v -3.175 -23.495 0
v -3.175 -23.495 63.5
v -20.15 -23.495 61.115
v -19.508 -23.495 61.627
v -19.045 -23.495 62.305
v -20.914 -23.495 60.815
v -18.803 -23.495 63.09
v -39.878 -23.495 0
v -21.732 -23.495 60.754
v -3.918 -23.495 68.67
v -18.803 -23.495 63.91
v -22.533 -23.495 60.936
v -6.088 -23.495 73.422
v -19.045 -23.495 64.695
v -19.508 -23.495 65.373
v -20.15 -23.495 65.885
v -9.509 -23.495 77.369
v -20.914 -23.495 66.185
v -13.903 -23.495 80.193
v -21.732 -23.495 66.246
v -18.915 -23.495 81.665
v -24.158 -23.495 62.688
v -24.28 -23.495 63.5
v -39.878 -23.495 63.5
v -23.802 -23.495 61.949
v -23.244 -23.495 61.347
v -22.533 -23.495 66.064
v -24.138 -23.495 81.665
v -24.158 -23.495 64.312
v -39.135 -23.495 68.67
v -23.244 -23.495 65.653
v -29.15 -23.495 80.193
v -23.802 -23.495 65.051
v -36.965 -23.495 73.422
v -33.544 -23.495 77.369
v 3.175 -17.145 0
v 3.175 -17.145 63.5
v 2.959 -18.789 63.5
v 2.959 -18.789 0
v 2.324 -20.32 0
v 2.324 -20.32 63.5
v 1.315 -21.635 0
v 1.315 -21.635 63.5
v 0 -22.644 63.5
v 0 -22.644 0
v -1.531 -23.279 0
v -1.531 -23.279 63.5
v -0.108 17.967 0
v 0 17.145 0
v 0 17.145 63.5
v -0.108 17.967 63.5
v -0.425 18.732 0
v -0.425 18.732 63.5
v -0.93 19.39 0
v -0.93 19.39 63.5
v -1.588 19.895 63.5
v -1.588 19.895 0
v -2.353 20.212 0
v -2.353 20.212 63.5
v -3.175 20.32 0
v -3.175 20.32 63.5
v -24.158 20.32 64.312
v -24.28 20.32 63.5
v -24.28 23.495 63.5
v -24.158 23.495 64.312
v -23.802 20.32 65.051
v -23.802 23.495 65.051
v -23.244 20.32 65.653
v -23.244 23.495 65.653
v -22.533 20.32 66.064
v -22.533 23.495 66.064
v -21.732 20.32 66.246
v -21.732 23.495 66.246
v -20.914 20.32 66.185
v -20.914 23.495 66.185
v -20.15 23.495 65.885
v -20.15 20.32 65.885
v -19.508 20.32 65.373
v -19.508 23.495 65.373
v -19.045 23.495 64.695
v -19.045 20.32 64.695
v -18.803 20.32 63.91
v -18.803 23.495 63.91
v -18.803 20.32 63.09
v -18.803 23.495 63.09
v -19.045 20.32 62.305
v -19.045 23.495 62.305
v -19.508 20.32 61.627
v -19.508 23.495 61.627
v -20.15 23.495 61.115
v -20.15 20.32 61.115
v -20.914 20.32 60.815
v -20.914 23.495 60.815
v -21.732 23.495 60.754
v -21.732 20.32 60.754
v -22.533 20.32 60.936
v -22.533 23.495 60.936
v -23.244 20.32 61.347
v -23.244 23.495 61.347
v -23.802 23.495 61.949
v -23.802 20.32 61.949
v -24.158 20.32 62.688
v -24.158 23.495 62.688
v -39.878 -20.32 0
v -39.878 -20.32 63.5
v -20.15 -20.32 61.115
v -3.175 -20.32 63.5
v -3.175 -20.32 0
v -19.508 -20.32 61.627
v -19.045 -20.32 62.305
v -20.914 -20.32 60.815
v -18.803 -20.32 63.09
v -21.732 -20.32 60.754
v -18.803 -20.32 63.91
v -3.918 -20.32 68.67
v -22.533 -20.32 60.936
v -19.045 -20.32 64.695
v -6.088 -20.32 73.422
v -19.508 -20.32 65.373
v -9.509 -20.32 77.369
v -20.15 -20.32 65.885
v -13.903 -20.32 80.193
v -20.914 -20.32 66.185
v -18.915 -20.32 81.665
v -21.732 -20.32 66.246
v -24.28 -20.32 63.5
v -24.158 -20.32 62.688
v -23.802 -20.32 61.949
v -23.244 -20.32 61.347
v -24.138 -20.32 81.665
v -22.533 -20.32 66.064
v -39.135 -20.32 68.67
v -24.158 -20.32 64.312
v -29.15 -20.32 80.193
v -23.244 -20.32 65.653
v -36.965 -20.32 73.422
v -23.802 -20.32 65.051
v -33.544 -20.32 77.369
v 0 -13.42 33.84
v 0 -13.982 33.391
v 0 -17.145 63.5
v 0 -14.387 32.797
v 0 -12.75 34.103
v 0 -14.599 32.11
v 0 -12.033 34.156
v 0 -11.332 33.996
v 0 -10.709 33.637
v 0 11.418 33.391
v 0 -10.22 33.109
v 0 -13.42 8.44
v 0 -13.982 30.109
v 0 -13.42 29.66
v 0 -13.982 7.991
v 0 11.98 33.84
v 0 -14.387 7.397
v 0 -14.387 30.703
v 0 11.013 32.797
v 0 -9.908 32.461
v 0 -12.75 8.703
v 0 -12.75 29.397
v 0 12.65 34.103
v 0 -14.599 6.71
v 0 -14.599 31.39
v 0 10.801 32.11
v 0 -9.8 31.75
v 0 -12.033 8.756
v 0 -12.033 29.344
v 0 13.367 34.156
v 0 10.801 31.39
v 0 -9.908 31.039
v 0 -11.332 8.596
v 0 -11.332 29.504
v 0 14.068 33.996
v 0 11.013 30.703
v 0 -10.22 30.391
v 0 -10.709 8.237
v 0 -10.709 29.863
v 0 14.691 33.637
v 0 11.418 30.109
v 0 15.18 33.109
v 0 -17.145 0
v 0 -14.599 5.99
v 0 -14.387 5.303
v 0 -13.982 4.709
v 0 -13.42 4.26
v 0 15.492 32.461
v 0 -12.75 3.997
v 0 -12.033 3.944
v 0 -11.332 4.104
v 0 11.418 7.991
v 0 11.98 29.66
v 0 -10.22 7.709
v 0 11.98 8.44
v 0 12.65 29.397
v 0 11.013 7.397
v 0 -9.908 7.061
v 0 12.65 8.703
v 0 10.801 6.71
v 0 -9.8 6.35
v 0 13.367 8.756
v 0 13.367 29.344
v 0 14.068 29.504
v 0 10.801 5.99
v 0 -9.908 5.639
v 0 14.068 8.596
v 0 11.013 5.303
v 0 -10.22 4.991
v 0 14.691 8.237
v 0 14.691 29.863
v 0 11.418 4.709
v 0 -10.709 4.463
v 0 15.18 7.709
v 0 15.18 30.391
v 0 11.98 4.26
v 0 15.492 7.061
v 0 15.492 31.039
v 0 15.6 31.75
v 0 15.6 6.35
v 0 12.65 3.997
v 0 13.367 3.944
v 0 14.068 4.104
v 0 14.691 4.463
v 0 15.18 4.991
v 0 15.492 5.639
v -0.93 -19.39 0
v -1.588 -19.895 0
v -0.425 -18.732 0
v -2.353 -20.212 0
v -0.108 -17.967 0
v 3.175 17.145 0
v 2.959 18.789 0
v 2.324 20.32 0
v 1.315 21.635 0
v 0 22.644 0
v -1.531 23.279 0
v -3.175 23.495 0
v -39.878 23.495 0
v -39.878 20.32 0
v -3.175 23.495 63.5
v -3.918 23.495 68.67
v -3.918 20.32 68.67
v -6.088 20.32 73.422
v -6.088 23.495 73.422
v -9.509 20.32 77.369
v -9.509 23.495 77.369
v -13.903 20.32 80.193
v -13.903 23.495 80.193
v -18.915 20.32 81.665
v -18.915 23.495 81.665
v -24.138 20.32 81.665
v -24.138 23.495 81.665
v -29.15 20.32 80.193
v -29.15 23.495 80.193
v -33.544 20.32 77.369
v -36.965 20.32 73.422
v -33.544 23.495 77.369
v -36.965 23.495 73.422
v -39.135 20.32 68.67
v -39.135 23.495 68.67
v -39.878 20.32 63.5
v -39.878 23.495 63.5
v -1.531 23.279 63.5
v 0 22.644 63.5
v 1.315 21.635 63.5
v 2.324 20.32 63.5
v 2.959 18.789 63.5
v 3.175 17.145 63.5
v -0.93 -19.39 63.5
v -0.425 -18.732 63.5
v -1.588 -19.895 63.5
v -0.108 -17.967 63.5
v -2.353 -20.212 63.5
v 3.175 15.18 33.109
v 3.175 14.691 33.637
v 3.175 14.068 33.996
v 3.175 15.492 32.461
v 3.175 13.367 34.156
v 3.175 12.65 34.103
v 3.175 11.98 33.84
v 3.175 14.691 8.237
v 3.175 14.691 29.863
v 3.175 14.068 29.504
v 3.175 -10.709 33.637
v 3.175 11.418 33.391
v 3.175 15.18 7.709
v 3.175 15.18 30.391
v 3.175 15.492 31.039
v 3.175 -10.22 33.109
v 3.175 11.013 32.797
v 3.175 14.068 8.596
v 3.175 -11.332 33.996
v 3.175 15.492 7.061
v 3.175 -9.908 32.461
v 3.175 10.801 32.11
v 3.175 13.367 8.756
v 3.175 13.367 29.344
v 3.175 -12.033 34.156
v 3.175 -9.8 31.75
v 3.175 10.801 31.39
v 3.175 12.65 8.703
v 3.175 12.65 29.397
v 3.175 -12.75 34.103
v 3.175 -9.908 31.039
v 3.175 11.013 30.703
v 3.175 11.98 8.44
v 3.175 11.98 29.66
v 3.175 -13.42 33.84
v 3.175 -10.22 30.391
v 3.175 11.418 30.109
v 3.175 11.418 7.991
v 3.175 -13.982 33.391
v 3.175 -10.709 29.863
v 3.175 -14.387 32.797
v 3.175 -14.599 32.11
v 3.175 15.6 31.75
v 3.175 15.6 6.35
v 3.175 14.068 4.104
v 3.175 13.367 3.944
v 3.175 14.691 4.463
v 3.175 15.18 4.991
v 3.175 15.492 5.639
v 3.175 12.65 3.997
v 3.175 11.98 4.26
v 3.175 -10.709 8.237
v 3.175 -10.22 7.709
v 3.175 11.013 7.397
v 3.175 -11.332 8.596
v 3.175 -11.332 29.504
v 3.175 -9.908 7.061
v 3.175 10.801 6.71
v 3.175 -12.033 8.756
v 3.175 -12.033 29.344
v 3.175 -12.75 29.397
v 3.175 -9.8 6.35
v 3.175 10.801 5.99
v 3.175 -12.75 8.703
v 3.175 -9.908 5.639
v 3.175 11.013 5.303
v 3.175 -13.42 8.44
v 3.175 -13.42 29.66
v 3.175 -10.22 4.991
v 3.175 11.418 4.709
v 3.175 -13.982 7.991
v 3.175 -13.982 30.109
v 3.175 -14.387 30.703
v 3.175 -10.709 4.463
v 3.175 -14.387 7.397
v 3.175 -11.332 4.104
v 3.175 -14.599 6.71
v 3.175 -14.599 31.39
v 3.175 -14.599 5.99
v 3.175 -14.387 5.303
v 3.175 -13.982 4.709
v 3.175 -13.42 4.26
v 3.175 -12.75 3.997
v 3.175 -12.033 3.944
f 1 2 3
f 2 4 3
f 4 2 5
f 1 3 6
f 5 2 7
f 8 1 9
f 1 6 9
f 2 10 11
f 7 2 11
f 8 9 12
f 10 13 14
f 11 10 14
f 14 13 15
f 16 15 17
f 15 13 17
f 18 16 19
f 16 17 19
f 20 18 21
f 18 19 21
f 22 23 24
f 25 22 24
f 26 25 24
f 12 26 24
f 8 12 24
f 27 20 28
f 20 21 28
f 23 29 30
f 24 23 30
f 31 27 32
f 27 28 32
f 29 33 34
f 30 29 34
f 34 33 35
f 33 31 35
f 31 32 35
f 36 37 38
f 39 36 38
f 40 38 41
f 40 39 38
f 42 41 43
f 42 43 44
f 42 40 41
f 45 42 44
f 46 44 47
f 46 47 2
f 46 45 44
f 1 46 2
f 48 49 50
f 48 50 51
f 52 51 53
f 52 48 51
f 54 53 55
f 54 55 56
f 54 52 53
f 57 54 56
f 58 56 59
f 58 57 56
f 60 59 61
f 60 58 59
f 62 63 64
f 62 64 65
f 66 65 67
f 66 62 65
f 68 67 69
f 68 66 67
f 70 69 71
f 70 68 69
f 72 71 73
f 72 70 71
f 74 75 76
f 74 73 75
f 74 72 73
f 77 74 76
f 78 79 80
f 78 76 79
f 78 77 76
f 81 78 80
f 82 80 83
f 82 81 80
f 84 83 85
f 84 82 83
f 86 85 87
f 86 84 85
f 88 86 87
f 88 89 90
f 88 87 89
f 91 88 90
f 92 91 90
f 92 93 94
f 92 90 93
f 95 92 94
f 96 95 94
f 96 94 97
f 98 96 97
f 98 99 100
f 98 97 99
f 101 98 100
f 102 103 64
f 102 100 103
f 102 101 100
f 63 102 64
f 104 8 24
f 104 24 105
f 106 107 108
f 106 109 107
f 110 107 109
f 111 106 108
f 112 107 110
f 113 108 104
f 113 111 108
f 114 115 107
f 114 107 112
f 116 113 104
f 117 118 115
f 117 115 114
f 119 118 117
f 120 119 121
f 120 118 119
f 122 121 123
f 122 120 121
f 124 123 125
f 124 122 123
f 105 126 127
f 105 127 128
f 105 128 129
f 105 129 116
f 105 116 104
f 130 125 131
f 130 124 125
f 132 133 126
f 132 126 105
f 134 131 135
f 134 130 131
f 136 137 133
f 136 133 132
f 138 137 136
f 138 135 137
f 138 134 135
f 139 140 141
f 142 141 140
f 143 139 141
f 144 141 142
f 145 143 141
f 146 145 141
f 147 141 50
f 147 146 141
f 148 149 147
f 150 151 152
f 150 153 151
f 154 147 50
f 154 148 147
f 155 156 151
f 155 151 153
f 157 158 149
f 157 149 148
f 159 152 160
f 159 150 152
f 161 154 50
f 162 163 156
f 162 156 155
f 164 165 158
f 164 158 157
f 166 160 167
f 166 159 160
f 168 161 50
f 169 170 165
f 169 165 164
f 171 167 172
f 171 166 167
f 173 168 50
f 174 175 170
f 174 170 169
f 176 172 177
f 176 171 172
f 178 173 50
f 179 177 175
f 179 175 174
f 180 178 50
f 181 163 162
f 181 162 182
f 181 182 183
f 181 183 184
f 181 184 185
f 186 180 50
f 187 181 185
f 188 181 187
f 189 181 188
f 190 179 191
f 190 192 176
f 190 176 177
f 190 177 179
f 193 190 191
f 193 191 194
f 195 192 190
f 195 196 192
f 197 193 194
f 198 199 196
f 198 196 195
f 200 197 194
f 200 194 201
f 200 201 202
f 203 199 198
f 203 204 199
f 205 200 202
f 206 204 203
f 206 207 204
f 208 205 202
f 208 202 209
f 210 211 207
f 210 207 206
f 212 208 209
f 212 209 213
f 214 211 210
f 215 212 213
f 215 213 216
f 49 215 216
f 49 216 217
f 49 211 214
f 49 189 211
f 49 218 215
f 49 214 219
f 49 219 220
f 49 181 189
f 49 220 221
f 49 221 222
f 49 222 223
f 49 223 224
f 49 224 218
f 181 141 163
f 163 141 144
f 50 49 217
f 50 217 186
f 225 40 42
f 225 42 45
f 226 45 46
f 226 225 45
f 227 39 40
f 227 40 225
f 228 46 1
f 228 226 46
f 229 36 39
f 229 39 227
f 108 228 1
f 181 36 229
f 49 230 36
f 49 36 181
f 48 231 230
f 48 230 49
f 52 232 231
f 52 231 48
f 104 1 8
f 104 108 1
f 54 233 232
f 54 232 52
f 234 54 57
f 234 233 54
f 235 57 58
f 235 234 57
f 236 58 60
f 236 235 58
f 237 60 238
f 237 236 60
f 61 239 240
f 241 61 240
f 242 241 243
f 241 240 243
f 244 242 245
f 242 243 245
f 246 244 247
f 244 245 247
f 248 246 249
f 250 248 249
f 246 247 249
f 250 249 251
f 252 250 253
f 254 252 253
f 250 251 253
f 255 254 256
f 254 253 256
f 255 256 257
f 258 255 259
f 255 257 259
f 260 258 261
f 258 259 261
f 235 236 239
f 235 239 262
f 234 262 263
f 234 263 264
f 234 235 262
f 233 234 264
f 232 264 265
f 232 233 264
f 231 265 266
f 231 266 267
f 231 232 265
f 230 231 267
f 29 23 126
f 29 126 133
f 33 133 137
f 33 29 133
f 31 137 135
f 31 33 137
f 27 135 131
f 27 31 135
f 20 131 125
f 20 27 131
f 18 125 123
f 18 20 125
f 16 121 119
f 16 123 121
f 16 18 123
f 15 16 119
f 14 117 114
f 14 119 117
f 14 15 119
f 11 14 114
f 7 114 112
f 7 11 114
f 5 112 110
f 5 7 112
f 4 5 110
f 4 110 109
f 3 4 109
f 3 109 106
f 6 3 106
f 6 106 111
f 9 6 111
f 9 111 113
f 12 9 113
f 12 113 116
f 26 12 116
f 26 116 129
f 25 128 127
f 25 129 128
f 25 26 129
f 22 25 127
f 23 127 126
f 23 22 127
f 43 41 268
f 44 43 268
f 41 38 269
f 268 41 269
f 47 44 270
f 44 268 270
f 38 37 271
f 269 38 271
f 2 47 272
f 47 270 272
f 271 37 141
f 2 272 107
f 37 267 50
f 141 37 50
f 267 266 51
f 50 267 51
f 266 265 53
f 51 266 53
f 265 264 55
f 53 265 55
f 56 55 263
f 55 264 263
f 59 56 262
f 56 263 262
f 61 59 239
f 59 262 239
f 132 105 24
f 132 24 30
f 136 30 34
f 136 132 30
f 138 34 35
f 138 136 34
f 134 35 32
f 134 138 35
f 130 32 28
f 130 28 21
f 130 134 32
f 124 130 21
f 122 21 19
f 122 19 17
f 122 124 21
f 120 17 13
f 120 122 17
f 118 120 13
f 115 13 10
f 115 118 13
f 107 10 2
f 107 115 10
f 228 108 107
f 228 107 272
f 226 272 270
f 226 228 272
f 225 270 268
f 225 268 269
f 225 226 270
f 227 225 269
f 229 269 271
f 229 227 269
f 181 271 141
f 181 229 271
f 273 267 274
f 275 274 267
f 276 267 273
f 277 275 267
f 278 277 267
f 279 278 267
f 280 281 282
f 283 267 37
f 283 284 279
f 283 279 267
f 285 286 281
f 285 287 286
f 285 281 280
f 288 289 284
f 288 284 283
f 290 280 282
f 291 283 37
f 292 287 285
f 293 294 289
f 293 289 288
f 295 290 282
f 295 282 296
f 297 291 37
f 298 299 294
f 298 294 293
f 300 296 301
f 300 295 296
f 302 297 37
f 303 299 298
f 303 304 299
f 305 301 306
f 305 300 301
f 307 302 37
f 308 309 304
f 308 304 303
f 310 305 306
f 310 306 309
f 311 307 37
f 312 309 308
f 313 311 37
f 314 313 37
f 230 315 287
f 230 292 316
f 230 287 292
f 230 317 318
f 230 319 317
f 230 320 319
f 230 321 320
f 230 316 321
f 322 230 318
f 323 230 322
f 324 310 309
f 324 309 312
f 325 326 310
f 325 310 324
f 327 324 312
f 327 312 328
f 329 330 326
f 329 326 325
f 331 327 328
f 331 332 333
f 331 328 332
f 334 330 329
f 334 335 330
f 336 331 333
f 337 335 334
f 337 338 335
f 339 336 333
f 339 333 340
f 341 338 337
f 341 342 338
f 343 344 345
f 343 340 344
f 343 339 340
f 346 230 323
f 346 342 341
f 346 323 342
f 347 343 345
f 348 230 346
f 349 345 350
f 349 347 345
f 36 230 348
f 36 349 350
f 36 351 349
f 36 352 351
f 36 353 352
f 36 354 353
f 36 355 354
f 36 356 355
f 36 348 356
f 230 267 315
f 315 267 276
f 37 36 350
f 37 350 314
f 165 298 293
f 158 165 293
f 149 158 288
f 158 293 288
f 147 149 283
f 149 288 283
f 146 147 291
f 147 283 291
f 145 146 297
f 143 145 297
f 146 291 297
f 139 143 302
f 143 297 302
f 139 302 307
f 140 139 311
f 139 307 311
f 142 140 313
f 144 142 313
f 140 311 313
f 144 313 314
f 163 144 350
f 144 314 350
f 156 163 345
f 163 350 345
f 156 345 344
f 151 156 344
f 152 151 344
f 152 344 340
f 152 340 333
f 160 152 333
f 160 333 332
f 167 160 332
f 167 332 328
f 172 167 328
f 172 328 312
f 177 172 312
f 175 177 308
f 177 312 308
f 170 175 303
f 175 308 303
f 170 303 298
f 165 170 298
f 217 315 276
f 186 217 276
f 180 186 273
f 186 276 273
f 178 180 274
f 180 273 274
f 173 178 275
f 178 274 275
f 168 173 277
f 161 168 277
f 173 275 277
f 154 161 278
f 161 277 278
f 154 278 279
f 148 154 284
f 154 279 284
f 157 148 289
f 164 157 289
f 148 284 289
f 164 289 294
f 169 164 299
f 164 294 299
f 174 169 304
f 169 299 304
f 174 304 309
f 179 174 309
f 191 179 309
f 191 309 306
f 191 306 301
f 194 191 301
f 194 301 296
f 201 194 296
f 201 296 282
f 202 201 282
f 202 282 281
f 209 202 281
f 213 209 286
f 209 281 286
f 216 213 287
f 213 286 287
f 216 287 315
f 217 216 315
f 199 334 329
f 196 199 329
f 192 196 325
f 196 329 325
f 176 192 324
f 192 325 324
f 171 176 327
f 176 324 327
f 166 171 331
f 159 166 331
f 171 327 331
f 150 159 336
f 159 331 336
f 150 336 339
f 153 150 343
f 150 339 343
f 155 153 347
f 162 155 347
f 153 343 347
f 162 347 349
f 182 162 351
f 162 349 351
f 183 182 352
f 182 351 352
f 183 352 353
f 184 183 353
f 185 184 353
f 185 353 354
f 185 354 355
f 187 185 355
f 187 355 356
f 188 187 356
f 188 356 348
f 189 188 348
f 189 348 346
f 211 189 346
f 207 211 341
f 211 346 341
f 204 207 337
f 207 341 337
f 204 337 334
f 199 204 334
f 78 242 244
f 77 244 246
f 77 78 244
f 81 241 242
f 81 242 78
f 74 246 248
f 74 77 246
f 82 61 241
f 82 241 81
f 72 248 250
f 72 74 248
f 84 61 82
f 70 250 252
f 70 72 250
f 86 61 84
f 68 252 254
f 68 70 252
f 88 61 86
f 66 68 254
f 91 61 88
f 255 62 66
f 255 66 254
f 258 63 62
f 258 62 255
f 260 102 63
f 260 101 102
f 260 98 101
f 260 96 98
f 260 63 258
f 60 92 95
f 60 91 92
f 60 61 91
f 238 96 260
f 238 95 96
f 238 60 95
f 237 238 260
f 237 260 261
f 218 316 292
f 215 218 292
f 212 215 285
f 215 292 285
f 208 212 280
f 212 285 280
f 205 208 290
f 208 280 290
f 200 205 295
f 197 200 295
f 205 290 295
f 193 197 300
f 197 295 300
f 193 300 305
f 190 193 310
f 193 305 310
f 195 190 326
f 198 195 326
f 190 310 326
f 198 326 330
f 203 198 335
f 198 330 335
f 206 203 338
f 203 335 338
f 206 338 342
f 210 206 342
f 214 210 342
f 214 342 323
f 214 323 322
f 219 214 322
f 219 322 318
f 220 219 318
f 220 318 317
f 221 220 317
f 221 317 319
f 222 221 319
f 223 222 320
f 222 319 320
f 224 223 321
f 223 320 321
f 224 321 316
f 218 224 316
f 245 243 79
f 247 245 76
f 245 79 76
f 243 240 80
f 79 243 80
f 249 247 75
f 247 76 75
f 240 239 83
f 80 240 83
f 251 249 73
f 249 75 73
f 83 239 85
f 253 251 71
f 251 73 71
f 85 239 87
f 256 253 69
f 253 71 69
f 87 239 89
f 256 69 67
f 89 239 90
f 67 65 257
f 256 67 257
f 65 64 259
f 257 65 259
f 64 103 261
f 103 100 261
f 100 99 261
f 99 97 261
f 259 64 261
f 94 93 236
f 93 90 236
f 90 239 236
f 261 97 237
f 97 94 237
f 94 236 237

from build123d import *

# Parameters (mm, degrees)
BASE_FLANGE1_DEPTH      = 63.5
BOSS_EXTRUDE1_DEPTH     = 3.175
BOSS_EXTRUDE2_START     = -3.175
BOSS_EXTRUDE2_DEPTH     = 3.175
SKETCH8_R               = 2.413
CUT_EXTRUDE1_DEPTH      = 3.175
CUT_EXTRUDE2_DEPTH      = 103.459665412
CUT_EXTRUDE2_DEPTH_BACK = 103.459665412
SKETCH10_R              = 2.753999953


# Sheet-metal steps are written as plain solids
with BuildPart() as part:
    # Sketch1 → Base-Flange1 (new body)
    with BuildSketch(Plane.XY):
        with BuildLine():
            Line((-39.878, -20.32), (-3.175, -20.32))
            ThreePointArc((-3.175, -20.32), (-0.92993597, -19.39006403), (0, -17.145))
            Line((0, -17.145), (0, 17.145))
            ThreePointArc((0, 17.145), (-0.92993597, 19.39006403), (-3.175, 20.32))
            Line((-3.175, 20.32), (-39.878, 20.32))
            Line((-39.878, 20.32), (-39.878, 23.495))
            Line((-39.878, 23.495), (-3.175, 23.495))
            ThreePointArc((-3.175, 23.495), (1.315128061, 21.635128061), (3.175, 17.145))
            Line((3.175, 17.145), (3.175, -17.145))
            ThreePointArc((3.175, -17.145), (1.315128061, -21.635128061), (-3.175, -23.495))
            Line((-3.175, -23.495), (-39.878, -23.495))
            Line((-39.878, -23.495), (-39.878, -20.32))
        make_face()
    extrude(amount=BASE_FLANGE1_DEPTH)

    # Sketch6 → Boss-Extrude1 (add)
    with BuildSketch(Plane(origin=(0, 23.495, 0), x_dir=(1, 0, 0), z_dir=(0, 1, 0))):
        with BuildLine():
            Line((-39.878, -63.5), (-3.175, -63.5))
            ThreePointArc((-3.175, -63.5), (-21.5265, -81.8515), (-39.878, -63.5))
        make_face()
    extrude(amount=-BOSS_EXTRUDE1_DEPTH)

    # Sketch7 → Boss-Extrude2 (add)
    with BuildSketch(Plane.XZ.offset(23.495).offset(BOSS_EXTRUDE2_START)):
        with BuildLine():
            Line((-3.175, 63.5), (-39.878, 63.5))
            ThreePointArc((-39.878, 63.5), (-21.5265, 81.8515), (-3.175, 63.5))
        make_face()
    extrude(amount=BOSS_EXTRUDE2_DEPTH)

    # Sketch8 → Cut-Extrude1 (cut)
    with BuildSketch(Plane(origin=(3.175, 0, 0), x_dir=(0, 0, -1), z_dir=(1, 0, 0))):
        with Locations(Location((-6.35, 13.18662794, 0), (0, 0, 90))):
            Circle(SKETCH8_R)
        with Locations(Location((-31.75, 13.18662794, 0), (0, 0, 90))):
            Circle(SKETCH8_R)
        with Locations(Location((-31.75, -12.21337206, 0), (0, 0, 90))):
            Circle(SKETCH8_R)
        with Locations(Location((-6.35, -12.21337206, 0), (0, 0, 90))):
            Circle(SKETCH8_R)
    extrude(amount=-CUT_EXTRUDE1_DEPTH, mode=Mode.SUBTRACT)

    # Sketch10 → Cut-Extrude2 (cut, two sides: drawn at the far end of the back side and taken through both)
    with BuildSketch(Plane(origin=(0, 23.495, 0), x_dir=(1, 0, 0), z_dir=(0, 1, 0)).offset(-CUT_EXTRUDE2_DEPTH_BACK)):
        with Locations(Location((-21.5265, -63.5, 0), (0, 0, 180))):
            Circle(SKETCH10_R)
    extrude(amount=CUT_EXTRUDE2_DEPTH + CUT_EXTRUDE2_DEPTH_BACK, mode=Mode.SUBTRACT)


solid = part.part
